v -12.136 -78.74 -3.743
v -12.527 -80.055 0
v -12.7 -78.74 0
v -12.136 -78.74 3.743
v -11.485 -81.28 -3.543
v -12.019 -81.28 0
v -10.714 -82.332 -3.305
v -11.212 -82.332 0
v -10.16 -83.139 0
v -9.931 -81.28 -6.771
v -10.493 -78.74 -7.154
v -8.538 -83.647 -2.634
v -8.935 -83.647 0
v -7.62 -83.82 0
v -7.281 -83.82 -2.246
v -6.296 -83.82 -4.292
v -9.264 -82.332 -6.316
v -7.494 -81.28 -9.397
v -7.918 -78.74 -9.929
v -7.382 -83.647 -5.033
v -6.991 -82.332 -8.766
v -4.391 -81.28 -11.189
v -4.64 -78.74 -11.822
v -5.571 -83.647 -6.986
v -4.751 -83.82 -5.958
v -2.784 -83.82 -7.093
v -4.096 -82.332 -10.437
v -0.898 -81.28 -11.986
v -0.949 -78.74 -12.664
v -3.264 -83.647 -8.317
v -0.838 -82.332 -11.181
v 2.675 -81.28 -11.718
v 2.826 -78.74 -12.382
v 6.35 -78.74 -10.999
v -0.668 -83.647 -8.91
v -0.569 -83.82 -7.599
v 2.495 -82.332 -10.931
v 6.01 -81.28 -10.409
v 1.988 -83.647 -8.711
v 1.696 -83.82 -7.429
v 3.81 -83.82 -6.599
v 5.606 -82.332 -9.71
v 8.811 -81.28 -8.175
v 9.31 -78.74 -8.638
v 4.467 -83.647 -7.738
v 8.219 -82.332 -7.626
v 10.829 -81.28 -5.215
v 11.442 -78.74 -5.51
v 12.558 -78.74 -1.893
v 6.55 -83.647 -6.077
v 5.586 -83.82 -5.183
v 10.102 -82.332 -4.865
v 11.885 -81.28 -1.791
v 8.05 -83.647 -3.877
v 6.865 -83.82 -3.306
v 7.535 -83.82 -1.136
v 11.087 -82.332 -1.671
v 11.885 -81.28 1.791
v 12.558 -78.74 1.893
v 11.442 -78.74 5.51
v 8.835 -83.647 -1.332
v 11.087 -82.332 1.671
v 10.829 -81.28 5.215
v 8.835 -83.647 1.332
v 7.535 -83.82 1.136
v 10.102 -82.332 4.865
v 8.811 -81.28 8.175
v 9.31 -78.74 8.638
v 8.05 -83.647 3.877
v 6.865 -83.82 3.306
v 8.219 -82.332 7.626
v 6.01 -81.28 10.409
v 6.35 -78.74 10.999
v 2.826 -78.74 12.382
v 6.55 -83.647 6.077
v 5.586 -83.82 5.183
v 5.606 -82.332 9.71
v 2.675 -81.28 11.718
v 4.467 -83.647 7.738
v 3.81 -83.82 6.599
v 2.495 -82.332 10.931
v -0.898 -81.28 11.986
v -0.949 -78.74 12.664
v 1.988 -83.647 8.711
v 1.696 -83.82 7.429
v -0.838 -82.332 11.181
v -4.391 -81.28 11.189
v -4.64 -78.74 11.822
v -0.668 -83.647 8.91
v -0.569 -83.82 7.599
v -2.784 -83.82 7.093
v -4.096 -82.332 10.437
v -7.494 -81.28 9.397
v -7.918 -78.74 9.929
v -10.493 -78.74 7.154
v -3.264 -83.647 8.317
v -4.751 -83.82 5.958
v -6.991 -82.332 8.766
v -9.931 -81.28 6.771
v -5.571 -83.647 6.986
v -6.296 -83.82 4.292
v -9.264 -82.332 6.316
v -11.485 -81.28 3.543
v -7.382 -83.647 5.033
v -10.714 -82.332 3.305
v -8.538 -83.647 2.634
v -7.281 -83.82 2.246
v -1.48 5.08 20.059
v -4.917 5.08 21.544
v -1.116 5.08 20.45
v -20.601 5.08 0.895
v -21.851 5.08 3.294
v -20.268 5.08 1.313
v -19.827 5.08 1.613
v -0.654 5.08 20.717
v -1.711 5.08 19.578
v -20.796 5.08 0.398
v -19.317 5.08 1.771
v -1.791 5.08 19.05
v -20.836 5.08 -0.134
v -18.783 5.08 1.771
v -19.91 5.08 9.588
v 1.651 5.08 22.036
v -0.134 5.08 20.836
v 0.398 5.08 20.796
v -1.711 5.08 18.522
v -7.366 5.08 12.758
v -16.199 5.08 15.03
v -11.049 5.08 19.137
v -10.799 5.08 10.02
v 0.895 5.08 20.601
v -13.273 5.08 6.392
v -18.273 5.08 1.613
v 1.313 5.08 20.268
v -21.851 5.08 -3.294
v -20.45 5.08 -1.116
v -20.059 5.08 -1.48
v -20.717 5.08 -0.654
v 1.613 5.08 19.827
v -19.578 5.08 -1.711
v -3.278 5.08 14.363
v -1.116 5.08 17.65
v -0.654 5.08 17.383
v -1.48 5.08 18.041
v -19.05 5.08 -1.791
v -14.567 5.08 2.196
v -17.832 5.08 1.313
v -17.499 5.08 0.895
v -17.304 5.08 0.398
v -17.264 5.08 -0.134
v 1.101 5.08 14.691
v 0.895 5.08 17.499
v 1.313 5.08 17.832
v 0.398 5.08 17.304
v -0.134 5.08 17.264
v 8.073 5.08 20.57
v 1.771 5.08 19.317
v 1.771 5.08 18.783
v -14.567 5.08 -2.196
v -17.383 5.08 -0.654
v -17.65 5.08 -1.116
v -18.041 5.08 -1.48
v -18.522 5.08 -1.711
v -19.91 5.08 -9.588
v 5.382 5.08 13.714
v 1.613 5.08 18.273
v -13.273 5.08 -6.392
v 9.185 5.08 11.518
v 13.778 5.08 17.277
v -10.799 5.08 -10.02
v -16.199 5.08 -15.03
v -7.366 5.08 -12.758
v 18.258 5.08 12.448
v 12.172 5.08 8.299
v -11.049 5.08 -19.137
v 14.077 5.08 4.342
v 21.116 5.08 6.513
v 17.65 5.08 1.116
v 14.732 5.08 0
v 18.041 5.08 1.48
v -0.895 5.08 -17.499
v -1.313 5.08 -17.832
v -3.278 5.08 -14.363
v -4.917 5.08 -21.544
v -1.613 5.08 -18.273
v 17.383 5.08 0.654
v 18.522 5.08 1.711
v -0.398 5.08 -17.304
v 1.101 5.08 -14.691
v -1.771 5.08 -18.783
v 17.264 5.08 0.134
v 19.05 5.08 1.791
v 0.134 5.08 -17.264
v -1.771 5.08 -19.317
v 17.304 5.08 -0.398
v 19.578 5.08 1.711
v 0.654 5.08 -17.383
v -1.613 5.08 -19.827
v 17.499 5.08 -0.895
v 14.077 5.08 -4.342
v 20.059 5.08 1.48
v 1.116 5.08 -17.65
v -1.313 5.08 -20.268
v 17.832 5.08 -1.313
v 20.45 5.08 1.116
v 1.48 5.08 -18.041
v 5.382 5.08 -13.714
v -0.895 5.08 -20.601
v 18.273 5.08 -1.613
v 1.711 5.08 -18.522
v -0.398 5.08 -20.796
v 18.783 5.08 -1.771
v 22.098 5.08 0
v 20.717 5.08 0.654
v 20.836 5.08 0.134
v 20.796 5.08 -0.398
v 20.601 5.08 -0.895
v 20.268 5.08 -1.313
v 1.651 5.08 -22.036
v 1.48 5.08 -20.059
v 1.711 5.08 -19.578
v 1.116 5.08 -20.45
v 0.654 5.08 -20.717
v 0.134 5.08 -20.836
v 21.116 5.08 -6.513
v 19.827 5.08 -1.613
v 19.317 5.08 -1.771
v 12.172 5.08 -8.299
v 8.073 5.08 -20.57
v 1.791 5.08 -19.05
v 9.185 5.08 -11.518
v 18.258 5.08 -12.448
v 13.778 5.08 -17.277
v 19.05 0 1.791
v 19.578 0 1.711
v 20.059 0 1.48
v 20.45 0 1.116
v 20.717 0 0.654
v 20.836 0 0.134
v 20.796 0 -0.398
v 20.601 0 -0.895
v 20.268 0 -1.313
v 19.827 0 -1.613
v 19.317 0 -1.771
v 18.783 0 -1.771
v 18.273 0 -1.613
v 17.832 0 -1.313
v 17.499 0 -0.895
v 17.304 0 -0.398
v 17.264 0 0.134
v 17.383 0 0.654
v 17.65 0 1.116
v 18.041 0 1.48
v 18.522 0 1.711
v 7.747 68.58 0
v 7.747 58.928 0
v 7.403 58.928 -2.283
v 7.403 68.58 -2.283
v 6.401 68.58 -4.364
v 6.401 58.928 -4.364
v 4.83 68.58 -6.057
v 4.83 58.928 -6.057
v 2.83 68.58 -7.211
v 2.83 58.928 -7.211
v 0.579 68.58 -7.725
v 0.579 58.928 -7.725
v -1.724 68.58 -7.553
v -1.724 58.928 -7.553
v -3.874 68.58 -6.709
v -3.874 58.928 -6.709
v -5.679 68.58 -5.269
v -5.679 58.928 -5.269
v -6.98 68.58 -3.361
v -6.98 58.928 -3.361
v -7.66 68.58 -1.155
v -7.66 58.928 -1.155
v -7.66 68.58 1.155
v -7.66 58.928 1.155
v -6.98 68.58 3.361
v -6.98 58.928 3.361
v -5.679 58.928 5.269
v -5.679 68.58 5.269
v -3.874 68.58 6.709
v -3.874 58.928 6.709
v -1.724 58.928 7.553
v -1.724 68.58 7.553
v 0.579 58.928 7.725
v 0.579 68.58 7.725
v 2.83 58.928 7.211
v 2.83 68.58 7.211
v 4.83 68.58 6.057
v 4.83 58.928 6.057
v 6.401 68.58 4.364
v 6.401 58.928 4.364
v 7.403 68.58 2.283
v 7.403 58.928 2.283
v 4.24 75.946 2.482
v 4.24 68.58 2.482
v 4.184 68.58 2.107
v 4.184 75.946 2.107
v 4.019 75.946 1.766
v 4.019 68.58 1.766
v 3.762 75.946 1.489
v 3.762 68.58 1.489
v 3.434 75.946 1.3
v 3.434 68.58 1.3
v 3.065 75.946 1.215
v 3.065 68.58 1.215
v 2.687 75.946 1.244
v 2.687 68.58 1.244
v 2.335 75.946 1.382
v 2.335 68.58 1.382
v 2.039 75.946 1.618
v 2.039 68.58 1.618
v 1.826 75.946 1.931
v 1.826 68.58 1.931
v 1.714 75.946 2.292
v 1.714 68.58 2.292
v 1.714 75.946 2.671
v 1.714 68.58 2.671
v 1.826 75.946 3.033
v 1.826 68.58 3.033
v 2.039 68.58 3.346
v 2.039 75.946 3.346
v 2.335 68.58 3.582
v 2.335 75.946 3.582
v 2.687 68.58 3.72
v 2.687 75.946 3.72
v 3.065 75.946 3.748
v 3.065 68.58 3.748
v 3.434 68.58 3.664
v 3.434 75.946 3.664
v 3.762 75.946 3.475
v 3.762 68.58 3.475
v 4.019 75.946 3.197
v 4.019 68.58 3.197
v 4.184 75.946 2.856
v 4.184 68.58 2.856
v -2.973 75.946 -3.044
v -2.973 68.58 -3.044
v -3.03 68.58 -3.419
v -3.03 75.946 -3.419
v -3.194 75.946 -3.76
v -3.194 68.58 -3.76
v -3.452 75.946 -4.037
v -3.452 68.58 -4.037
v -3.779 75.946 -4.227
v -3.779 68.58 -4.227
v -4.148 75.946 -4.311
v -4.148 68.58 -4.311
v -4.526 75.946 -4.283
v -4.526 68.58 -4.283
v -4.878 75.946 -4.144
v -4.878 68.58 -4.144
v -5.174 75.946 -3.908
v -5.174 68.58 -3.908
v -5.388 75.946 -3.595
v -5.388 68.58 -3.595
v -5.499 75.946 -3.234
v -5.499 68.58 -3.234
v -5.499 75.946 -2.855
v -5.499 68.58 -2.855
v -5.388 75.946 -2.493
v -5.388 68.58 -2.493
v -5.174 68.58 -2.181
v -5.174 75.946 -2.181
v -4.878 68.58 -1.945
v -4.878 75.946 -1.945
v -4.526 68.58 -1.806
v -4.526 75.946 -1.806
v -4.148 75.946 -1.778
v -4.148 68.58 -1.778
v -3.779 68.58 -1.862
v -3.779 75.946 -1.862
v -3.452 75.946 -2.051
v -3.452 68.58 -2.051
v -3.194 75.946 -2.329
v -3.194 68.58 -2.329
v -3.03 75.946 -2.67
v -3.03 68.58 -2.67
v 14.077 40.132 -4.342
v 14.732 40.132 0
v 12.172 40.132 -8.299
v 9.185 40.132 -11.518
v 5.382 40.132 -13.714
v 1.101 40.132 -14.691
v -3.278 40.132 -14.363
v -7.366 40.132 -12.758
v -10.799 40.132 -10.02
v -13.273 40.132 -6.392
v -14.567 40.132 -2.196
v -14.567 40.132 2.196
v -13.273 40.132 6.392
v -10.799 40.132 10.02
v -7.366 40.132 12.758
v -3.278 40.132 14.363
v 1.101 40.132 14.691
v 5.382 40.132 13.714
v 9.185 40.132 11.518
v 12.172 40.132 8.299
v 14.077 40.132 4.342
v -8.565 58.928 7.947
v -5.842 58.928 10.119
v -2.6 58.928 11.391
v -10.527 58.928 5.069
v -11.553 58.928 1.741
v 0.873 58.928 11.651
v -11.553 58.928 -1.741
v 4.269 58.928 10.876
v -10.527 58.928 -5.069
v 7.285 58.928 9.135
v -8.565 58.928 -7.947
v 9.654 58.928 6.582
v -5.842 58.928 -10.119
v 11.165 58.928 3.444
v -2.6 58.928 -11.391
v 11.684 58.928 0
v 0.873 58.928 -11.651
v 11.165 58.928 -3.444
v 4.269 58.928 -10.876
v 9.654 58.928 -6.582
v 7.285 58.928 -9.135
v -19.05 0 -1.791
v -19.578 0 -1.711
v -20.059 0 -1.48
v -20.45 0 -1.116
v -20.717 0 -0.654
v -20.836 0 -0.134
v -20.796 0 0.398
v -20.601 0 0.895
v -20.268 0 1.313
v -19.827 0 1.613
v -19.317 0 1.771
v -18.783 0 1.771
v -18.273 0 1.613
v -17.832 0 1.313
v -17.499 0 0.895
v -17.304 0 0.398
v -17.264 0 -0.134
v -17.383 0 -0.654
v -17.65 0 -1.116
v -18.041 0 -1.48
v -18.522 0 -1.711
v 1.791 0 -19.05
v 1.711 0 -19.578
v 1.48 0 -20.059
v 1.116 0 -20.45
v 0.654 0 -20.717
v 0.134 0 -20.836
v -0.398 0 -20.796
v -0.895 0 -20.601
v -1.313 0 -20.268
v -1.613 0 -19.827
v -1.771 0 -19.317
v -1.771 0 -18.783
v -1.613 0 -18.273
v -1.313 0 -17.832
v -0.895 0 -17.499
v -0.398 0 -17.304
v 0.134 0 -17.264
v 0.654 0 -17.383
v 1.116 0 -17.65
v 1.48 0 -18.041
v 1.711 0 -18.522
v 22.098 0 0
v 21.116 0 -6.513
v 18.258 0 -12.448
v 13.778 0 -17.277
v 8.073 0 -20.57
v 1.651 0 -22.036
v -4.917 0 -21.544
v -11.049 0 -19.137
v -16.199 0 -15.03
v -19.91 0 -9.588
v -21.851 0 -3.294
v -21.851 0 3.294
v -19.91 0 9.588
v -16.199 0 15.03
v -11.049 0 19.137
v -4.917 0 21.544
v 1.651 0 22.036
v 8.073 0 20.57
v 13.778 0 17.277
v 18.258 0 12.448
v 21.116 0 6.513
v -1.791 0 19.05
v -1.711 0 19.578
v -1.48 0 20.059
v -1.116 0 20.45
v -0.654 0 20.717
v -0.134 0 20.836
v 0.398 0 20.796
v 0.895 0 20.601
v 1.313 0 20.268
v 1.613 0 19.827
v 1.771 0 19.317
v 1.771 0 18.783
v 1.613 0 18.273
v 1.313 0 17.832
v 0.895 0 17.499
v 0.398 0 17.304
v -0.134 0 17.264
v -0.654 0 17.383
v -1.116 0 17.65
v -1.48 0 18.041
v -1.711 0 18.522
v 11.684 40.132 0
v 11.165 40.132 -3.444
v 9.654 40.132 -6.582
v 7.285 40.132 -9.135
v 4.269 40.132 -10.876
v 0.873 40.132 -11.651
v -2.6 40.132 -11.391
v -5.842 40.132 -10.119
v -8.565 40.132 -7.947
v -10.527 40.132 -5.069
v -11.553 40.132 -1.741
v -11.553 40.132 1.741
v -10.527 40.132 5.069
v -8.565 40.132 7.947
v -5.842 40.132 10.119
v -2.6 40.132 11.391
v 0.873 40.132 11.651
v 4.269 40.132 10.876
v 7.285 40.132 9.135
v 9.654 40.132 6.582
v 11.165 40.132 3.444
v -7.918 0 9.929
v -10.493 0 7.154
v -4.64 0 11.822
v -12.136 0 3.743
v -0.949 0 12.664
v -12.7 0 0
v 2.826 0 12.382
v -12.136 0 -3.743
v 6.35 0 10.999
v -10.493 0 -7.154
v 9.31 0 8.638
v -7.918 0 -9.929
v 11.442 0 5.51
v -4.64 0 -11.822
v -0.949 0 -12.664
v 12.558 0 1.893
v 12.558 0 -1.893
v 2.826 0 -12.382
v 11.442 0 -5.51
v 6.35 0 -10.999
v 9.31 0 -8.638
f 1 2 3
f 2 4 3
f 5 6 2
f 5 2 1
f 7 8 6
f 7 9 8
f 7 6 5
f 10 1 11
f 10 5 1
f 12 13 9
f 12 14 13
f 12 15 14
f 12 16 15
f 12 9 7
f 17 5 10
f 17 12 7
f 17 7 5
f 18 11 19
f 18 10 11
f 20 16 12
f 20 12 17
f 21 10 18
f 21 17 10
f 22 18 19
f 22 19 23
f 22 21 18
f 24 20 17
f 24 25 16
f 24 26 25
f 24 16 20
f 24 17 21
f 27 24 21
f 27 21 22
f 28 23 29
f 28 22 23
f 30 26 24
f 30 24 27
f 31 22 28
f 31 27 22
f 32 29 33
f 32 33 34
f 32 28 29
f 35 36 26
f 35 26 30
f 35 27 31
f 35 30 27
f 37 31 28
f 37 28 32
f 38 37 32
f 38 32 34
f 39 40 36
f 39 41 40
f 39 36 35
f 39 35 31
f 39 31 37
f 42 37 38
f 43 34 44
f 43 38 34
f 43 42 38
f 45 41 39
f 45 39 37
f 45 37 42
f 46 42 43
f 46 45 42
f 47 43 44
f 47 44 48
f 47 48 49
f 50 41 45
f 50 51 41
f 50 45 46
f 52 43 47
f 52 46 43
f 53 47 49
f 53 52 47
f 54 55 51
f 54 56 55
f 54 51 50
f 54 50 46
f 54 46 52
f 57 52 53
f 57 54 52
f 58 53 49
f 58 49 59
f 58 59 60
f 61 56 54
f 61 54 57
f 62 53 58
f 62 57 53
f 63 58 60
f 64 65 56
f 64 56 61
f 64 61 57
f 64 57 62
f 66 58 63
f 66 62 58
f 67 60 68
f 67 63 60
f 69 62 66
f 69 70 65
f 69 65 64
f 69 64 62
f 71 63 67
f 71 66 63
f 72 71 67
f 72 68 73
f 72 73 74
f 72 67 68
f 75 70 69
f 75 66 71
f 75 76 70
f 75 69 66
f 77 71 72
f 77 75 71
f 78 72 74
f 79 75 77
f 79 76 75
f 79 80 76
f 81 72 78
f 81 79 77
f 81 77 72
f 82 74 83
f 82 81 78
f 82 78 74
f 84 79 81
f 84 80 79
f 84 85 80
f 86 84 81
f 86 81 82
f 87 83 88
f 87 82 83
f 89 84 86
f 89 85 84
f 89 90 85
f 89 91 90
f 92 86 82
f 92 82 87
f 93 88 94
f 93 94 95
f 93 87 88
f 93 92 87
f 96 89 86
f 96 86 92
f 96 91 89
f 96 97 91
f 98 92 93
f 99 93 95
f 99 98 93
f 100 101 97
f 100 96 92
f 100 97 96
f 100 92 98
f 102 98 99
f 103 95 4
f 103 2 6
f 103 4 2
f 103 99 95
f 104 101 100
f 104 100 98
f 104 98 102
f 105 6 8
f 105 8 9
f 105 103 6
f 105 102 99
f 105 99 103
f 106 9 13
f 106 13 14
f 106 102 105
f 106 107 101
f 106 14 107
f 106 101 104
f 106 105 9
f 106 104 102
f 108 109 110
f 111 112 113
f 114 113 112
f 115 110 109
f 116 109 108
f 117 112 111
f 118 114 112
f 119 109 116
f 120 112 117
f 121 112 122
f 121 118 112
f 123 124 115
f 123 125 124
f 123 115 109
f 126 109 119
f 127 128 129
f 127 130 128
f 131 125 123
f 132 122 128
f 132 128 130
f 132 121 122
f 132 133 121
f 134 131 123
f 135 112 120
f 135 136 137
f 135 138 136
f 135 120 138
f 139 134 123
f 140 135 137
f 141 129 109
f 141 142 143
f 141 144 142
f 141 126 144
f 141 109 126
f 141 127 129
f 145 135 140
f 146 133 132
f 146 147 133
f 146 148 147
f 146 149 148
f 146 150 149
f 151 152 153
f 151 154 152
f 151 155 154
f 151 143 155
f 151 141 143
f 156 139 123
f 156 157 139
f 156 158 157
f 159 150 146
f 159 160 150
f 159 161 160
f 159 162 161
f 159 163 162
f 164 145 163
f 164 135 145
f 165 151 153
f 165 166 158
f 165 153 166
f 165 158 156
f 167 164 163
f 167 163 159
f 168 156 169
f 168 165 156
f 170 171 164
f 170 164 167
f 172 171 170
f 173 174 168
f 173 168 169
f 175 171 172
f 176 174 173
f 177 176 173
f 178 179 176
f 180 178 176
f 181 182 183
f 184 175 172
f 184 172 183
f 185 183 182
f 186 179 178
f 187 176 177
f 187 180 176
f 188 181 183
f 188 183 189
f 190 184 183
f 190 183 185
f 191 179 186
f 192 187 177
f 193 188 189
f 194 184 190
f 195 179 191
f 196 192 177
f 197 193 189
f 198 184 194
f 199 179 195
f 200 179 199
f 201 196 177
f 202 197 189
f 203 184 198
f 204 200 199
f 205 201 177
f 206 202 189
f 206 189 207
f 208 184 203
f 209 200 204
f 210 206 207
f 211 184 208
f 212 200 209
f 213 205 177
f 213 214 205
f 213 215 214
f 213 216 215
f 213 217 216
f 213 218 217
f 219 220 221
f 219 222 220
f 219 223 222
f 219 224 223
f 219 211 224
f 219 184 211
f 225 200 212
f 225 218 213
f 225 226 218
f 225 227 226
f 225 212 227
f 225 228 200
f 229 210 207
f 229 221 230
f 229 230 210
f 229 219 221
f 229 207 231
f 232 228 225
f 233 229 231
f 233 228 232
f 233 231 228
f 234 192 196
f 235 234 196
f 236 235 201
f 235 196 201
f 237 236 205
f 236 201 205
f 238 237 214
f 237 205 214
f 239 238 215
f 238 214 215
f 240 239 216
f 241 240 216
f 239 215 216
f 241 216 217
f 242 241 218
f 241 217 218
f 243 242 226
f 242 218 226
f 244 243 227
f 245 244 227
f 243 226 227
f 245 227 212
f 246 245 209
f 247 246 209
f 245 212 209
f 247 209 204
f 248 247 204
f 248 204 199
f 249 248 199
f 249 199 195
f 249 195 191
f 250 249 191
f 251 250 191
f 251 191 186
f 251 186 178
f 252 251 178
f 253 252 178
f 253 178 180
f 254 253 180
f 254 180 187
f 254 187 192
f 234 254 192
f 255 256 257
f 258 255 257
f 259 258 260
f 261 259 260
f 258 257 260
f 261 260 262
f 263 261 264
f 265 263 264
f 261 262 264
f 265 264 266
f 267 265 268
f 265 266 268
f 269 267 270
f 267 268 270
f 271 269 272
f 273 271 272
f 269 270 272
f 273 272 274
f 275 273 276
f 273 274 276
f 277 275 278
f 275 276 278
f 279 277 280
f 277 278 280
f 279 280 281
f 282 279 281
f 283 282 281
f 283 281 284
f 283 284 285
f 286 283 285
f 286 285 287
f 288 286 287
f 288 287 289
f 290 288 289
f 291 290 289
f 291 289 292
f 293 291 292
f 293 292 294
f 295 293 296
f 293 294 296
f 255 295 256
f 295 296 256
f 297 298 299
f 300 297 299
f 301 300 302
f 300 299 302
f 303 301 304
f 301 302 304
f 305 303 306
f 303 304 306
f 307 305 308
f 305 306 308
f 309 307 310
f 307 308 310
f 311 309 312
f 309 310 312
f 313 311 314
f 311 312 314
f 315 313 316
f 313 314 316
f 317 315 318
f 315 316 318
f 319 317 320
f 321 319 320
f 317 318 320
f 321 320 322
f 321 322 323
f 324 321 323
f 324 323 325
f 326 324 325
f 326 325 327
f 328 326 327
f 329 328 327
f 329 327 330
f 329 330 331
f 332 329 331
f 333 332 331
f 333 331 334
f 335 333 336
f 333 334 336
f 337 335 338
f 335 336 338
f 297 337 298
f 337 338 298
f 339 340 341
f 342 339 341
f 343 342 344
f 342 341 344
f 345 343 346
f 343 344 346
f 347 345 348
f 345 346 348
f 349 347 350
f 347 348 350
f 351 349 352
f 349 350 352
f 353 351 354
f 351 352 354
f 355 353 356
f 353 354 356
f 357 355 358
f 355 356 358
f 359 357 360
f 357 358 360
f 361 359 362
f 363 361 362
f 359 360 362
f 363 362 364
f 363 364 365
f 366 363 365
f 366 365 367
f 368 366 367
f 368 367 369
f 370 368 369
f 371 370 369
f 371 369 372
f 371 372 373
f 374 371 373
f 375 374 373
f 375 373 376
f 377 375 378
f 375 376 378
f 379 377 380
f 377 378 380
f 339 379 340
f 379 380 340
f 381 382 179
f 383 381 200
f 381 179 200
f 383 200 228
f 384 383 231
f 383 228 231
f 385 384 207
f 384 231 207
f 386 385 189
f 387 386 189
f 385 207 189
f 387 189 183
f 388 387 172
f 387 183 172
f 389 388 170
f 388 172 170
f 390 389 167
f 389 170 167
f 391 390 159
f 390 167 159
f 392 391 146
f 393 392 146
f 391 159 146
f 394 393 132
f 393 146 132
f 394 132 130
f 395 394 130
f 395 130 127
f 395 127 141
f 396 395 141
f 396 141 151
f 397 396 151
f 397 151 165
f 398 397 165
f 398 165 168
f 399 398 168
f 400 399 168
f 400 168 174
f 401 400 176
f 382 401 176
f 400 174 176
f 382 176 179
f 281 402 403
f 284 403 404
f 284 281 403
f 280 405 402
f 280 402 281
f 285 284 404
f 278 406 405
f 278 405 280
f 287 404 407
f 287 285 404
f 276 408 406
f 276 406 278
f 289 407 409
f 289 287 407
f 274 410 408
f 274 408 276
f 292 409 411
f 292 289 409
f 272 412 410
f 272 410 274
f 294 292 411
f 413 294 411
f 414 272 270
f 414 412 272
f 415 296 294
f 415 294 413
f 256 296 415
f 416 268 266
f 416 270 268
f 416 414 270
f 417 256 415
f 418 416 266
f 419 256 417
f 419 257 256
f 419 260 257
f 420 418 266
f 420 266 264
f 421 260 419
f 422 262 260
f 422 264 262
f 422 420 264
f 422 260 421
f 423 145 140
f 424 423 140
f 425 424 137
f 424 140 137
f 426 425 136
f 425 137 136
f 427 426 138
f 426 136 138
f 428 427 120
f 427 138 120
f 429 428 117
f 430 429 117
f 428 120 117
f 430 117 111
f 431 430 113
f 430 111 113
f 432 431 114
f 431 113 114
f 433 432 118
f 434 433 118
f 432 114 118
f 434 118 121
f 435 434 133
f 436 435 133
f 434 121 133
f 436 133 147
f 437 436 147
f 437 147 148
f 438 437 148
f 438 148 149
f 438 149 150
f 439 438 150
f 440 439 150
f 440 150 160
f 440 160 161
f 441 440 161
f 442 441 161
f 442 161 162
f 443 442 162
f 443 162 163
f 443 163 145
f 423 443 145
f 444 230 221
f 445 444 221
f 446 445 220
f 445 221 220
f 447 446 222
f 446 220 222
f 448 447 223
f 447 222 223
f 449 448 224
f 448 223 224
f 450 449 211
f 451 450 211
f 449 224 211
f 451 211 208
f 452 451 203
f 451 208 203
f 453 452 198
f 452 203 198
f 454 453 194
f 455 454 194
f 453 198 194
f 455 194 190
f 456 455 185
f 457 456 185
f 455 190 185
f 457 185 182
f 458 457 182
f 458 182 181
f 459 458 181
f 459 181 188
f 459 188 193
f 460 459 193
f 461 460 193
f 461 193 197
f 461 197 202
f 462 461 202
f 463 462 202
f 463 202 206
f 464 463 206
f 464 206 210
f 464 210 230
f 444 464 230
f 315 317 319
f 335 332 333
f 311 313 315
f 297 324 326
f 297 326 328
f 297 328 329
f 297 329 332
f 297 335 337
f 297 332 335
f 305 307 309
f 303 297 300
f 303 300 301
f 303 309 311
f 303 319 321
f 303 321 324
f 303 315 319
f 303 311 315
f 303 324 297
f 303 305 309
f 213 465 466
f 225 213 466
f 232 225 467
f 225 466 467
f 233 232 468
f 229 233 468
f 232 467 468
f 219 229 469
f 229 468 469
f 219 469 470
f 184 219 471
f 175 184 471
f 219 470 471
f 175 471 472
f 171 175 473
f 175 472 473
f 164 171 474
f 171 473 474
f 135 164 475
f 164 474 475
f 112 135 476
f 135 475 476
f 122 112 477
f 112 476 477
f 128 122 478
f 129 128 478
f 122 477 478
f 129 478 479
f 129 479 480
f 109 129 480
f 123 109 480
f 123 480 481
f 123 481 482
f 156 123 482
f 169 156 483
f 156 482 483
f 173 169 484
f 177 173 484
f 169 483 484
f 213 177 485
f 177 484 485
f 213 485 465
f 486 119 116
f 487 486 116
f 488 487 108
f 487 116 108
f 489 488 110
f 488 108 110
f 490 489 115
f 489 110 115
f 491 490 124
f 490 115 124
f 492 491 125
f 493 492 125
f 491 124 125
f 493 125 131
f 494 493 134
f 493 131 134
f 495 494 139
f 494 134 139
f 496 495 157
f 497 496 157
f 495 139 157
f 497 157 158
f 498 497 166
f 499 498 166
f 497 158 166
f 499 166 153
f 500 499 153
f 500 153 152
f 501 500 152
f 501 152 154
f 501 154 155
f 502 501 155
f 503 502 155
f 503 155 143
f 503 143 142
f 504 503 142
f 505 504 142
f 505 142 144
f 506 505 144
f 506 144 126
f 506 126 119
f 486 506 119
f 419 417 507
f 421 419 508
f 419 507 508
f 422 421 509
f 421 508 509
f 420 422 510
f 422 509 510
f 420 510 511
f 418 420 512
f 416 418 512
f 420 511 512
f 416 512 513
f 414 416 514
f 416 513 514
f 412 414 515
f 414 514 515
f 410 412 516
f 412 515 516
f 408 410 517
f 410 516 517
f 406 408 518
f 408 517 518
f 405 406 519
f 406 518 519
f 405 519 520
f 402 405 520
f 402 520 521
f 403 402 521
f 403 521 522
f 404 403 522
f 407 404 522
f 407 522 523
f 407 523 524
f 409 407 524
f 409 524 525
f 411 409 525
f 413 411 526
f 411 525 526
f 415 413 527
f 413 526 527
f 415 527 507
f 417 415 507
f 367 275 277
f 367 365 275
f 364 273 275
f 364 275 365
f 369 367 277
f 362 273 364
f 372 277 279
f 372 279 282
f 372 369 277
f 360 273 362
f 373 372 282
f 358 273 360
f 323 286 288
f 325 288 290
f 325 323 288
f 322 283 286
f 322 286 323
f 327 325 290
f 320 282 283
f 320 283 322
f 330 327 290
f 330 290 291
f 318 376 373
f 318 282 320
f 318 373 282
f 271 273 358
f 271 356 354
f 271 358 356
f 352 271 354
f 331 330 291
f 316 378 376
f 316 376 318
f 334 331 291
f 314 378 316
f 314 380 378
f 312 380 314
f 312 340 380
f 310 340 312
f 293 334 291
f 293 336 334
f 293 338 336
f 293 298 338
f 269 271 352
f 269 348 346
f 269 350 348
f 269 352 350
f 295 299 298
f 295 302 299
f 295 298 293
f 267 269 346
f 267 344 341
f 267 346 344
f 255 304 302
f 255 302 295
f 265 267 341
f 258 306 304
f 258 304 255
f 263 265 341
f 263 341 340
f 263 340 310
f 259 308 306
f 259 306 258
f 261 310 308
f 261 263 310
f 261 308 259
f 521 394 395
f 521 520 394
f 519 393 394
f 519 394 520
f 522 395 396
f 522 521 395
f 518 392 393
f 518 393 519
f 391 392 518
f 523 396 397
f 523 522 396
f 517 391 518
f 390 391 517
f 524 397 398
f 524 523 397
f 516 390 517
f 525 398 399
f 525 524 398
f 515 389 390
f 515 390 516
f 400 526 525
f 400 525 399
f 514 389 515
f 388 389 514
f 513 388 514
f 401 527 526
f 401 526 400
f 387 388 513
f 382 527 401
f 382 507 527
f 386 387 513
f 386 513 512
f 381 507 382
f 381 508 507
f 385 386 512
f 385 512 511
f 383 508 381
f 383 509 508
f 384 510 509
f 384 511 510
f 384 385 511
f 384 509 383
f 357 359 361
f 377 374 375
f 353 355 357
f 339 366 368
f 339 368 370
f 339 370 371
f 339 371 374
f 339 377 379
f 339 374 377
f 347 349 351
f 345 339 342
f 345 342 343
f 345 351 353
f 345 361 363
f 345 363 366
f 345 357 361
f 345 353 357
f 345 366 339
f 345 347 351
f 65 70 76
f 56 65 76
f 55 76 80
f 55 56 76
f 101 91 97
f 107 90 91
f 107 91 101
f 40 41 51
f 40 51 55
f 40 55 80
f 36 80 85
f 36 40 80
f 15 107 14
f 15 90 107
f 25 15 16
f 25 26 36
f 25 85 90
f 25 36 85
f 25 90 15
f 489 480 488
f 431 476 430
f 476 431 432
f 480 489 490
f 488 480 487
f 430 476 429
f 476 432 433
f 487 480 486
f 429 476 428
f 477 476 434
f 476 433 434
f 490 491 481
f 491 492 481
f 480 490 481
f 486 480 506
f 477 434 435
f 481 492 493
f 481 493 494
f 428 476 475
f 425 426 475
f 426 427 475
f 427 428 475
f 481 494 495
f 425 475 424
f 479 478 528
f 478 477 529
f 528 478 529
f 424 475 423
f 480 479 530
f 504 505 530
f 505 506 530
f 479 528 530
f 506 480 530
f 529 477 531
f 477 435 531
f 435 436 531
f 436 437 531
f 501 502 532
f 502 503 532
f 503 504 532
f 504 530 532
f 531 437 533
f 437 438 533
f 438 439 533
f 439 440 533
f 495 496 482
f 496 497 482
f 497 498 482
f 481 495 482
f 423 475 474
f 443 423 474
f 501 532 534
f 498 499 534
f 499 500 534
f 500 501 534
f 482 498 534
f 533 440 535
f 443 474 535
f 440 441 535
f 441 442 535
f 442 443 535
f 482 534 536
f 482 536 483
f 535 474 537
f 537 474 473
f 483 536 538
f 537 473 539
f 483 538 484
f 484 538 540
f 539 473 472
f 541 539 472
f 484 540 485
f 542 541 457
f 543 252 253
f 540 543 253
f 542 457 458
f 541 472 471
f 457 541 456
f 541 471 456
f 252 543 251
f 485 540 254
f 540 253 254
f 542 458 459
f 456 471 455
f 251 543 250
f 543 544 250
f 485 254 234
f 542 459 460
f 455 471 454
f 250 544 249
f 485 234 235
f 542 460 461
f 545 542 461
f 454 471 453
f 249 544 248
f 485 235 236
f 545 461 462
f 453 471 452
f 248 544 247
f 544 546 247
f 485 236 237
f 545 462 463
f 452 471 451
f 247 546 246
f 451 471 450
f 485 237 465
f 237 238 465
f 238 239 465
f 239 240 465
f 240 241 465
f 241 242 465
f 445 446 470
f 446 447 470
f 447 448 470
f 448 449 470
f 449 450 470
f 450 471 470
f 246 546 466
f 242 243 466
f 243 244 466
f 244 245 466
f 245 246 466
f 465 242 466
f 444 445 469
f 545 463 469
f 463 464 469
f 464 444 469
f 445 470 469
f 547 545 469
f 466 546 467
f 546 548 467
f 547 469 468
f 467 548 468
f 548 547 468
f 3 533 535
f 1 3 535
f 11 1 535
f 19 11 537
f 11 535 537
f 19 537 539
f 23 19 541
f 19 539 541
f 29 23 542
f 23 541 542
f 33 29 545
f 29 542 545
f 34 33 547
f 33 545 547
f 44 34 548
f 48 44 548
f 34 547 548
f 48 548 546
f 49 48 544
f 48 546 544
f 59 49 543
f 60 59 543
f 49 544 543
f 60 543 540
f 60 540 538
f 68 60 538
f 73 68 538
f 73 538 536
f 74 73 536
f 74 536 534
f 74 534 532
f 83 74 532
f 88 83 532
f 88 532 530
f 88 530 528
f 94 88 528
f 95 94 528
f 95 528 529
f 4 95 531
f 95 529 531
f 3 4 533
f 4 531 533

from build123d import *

# Parameters (mm, degrees)
SKETCH1_R           = 22.098
BOSS_EXTRUDE1_DEPTH = 5.08
SKETCH2_R           = 14.732
BOSS_EXTRUDE2_DEPTH = 35.052
SKETCH3_R           = 11.684
BOSS_EXTRUDE3_DEPTH = 18.796
SKETCH4_R           = 7.747
BOSS_EXTRUDE4_DEPTH = 9.652
SKETCH5_R           = 1.27
BOSS_EXTRUDE5_DEPTH = 7.366
SKETCH6_R           = 1.7907
CUT_EXTRUDE1_DEPTH  = 7.366
CIRPATTERN1_COUNT   = 4
SKETCH7_R           = 12.7
BOSS_EXTRUDE6_DEPTH = 83.82
FILLET1_R           = 5.08


with BuildPart() as part:
    # Sketch1 → Boss-Extrude1 (new body)
    with BuildSketch(Plane(origin=(0, 0, 0), x_dir=(1, 0, 0), z_dir=(0, 1, 0))):
        Circle(SKETCH1_R)
    extrude(amount=BOSS_EXTRUDE1_DEPTH)

    # Sketch2 → Boss-Extrude2 (add)
    with BuildSketch(Plane(origin=(0, 5.08, 0), x_dir=(1, 0, 0), z_dir=(0, 1, 0))):
        Circle(SKETCH2_R)
    extrude(amount=BOSS_EXTRUDE2_DEPTH)

    # Sketch3 → Boss-Extrude3 (add)
    with BuildSketch(Plane(origin=(0, 40.132, 0), x_dir=(1, 0, 0), z_dir=(0, 1, 0))):
        Circle(SKETCH3_R)
    extrude(amount=BOSS_EXTRUDE3_DEPTH)

    # Sketch4 → Boss-Extrude4 (add)
    with BuildSketch(Plane(origin=(0, 58.928, 0), x_dir=(1, 0, 0), z_dir=(0, 1, 0))):
        Circle(SKETCH4_R)
    extrude(amount=BOSS_EXTRUDE4_DEPTH)

    # Sketch5 → Boss-Extrude5 (add)
    with BuildSketch(Plane(origin=(0, 68.58, 0), x_dir=(1, 0, 0), z_dir=(0, 1, 0))):
        with Locations((-4.243406318, 3.044398822)):
            Circle(SKETCH5_R)
        with Locations((2.970026773, -2.481757502)):
            Circle(SKETCH5_R)
    extrude(amount=BOSS_EXTRUDE5_DEPTH)

    # Sketch6 → Cut-Extrude1 (cut)
    with BuildSketch(Plane(origin=(0, 5.08, 0), x_dir=(1, 0, 0), z_dir=(0, 1, 0))):
        with Locations((0, 19.05)):
            Circle(SKETCH6_R)
    cut_extrude1 = extrude(amount=-CUT_EXTRUDE1_DEPTH, mode=Mode.SUBTRACT)

    # CirPattern1: Cut-Extrude1 ×4 about axis
    cirpattern1_axis = Axis((0, 0, 0), (0, 1, 0))
    for i in range(1, CIRPATTERN1_COUNT):
        add(cut_extrude1.rotate(cirpattern1_axis, i * 360 / CIRPATTERN1_COUNT), mode=Mode.SUBTRACT)

    # Sketch7 → Boss-Extrude6 (add)
    with BuildSketch(Plane(origin=(0, 0, 0), x_dir=(-1, 0, 0), z_dir=(0, -1, 0))):
        Circle(SKETCH7_R)
    extrude(amount=BOSS_EXTRUDE6_DEPTH)

    # Fillet1
    fillet1_edges = [part.edges().sort_by_distance(p)[0] for p in [
        (12.7, -83.82, 0),
    ]]
    fillet(fillet1_edges, radius=FILLET1_R)


solid = part.part
